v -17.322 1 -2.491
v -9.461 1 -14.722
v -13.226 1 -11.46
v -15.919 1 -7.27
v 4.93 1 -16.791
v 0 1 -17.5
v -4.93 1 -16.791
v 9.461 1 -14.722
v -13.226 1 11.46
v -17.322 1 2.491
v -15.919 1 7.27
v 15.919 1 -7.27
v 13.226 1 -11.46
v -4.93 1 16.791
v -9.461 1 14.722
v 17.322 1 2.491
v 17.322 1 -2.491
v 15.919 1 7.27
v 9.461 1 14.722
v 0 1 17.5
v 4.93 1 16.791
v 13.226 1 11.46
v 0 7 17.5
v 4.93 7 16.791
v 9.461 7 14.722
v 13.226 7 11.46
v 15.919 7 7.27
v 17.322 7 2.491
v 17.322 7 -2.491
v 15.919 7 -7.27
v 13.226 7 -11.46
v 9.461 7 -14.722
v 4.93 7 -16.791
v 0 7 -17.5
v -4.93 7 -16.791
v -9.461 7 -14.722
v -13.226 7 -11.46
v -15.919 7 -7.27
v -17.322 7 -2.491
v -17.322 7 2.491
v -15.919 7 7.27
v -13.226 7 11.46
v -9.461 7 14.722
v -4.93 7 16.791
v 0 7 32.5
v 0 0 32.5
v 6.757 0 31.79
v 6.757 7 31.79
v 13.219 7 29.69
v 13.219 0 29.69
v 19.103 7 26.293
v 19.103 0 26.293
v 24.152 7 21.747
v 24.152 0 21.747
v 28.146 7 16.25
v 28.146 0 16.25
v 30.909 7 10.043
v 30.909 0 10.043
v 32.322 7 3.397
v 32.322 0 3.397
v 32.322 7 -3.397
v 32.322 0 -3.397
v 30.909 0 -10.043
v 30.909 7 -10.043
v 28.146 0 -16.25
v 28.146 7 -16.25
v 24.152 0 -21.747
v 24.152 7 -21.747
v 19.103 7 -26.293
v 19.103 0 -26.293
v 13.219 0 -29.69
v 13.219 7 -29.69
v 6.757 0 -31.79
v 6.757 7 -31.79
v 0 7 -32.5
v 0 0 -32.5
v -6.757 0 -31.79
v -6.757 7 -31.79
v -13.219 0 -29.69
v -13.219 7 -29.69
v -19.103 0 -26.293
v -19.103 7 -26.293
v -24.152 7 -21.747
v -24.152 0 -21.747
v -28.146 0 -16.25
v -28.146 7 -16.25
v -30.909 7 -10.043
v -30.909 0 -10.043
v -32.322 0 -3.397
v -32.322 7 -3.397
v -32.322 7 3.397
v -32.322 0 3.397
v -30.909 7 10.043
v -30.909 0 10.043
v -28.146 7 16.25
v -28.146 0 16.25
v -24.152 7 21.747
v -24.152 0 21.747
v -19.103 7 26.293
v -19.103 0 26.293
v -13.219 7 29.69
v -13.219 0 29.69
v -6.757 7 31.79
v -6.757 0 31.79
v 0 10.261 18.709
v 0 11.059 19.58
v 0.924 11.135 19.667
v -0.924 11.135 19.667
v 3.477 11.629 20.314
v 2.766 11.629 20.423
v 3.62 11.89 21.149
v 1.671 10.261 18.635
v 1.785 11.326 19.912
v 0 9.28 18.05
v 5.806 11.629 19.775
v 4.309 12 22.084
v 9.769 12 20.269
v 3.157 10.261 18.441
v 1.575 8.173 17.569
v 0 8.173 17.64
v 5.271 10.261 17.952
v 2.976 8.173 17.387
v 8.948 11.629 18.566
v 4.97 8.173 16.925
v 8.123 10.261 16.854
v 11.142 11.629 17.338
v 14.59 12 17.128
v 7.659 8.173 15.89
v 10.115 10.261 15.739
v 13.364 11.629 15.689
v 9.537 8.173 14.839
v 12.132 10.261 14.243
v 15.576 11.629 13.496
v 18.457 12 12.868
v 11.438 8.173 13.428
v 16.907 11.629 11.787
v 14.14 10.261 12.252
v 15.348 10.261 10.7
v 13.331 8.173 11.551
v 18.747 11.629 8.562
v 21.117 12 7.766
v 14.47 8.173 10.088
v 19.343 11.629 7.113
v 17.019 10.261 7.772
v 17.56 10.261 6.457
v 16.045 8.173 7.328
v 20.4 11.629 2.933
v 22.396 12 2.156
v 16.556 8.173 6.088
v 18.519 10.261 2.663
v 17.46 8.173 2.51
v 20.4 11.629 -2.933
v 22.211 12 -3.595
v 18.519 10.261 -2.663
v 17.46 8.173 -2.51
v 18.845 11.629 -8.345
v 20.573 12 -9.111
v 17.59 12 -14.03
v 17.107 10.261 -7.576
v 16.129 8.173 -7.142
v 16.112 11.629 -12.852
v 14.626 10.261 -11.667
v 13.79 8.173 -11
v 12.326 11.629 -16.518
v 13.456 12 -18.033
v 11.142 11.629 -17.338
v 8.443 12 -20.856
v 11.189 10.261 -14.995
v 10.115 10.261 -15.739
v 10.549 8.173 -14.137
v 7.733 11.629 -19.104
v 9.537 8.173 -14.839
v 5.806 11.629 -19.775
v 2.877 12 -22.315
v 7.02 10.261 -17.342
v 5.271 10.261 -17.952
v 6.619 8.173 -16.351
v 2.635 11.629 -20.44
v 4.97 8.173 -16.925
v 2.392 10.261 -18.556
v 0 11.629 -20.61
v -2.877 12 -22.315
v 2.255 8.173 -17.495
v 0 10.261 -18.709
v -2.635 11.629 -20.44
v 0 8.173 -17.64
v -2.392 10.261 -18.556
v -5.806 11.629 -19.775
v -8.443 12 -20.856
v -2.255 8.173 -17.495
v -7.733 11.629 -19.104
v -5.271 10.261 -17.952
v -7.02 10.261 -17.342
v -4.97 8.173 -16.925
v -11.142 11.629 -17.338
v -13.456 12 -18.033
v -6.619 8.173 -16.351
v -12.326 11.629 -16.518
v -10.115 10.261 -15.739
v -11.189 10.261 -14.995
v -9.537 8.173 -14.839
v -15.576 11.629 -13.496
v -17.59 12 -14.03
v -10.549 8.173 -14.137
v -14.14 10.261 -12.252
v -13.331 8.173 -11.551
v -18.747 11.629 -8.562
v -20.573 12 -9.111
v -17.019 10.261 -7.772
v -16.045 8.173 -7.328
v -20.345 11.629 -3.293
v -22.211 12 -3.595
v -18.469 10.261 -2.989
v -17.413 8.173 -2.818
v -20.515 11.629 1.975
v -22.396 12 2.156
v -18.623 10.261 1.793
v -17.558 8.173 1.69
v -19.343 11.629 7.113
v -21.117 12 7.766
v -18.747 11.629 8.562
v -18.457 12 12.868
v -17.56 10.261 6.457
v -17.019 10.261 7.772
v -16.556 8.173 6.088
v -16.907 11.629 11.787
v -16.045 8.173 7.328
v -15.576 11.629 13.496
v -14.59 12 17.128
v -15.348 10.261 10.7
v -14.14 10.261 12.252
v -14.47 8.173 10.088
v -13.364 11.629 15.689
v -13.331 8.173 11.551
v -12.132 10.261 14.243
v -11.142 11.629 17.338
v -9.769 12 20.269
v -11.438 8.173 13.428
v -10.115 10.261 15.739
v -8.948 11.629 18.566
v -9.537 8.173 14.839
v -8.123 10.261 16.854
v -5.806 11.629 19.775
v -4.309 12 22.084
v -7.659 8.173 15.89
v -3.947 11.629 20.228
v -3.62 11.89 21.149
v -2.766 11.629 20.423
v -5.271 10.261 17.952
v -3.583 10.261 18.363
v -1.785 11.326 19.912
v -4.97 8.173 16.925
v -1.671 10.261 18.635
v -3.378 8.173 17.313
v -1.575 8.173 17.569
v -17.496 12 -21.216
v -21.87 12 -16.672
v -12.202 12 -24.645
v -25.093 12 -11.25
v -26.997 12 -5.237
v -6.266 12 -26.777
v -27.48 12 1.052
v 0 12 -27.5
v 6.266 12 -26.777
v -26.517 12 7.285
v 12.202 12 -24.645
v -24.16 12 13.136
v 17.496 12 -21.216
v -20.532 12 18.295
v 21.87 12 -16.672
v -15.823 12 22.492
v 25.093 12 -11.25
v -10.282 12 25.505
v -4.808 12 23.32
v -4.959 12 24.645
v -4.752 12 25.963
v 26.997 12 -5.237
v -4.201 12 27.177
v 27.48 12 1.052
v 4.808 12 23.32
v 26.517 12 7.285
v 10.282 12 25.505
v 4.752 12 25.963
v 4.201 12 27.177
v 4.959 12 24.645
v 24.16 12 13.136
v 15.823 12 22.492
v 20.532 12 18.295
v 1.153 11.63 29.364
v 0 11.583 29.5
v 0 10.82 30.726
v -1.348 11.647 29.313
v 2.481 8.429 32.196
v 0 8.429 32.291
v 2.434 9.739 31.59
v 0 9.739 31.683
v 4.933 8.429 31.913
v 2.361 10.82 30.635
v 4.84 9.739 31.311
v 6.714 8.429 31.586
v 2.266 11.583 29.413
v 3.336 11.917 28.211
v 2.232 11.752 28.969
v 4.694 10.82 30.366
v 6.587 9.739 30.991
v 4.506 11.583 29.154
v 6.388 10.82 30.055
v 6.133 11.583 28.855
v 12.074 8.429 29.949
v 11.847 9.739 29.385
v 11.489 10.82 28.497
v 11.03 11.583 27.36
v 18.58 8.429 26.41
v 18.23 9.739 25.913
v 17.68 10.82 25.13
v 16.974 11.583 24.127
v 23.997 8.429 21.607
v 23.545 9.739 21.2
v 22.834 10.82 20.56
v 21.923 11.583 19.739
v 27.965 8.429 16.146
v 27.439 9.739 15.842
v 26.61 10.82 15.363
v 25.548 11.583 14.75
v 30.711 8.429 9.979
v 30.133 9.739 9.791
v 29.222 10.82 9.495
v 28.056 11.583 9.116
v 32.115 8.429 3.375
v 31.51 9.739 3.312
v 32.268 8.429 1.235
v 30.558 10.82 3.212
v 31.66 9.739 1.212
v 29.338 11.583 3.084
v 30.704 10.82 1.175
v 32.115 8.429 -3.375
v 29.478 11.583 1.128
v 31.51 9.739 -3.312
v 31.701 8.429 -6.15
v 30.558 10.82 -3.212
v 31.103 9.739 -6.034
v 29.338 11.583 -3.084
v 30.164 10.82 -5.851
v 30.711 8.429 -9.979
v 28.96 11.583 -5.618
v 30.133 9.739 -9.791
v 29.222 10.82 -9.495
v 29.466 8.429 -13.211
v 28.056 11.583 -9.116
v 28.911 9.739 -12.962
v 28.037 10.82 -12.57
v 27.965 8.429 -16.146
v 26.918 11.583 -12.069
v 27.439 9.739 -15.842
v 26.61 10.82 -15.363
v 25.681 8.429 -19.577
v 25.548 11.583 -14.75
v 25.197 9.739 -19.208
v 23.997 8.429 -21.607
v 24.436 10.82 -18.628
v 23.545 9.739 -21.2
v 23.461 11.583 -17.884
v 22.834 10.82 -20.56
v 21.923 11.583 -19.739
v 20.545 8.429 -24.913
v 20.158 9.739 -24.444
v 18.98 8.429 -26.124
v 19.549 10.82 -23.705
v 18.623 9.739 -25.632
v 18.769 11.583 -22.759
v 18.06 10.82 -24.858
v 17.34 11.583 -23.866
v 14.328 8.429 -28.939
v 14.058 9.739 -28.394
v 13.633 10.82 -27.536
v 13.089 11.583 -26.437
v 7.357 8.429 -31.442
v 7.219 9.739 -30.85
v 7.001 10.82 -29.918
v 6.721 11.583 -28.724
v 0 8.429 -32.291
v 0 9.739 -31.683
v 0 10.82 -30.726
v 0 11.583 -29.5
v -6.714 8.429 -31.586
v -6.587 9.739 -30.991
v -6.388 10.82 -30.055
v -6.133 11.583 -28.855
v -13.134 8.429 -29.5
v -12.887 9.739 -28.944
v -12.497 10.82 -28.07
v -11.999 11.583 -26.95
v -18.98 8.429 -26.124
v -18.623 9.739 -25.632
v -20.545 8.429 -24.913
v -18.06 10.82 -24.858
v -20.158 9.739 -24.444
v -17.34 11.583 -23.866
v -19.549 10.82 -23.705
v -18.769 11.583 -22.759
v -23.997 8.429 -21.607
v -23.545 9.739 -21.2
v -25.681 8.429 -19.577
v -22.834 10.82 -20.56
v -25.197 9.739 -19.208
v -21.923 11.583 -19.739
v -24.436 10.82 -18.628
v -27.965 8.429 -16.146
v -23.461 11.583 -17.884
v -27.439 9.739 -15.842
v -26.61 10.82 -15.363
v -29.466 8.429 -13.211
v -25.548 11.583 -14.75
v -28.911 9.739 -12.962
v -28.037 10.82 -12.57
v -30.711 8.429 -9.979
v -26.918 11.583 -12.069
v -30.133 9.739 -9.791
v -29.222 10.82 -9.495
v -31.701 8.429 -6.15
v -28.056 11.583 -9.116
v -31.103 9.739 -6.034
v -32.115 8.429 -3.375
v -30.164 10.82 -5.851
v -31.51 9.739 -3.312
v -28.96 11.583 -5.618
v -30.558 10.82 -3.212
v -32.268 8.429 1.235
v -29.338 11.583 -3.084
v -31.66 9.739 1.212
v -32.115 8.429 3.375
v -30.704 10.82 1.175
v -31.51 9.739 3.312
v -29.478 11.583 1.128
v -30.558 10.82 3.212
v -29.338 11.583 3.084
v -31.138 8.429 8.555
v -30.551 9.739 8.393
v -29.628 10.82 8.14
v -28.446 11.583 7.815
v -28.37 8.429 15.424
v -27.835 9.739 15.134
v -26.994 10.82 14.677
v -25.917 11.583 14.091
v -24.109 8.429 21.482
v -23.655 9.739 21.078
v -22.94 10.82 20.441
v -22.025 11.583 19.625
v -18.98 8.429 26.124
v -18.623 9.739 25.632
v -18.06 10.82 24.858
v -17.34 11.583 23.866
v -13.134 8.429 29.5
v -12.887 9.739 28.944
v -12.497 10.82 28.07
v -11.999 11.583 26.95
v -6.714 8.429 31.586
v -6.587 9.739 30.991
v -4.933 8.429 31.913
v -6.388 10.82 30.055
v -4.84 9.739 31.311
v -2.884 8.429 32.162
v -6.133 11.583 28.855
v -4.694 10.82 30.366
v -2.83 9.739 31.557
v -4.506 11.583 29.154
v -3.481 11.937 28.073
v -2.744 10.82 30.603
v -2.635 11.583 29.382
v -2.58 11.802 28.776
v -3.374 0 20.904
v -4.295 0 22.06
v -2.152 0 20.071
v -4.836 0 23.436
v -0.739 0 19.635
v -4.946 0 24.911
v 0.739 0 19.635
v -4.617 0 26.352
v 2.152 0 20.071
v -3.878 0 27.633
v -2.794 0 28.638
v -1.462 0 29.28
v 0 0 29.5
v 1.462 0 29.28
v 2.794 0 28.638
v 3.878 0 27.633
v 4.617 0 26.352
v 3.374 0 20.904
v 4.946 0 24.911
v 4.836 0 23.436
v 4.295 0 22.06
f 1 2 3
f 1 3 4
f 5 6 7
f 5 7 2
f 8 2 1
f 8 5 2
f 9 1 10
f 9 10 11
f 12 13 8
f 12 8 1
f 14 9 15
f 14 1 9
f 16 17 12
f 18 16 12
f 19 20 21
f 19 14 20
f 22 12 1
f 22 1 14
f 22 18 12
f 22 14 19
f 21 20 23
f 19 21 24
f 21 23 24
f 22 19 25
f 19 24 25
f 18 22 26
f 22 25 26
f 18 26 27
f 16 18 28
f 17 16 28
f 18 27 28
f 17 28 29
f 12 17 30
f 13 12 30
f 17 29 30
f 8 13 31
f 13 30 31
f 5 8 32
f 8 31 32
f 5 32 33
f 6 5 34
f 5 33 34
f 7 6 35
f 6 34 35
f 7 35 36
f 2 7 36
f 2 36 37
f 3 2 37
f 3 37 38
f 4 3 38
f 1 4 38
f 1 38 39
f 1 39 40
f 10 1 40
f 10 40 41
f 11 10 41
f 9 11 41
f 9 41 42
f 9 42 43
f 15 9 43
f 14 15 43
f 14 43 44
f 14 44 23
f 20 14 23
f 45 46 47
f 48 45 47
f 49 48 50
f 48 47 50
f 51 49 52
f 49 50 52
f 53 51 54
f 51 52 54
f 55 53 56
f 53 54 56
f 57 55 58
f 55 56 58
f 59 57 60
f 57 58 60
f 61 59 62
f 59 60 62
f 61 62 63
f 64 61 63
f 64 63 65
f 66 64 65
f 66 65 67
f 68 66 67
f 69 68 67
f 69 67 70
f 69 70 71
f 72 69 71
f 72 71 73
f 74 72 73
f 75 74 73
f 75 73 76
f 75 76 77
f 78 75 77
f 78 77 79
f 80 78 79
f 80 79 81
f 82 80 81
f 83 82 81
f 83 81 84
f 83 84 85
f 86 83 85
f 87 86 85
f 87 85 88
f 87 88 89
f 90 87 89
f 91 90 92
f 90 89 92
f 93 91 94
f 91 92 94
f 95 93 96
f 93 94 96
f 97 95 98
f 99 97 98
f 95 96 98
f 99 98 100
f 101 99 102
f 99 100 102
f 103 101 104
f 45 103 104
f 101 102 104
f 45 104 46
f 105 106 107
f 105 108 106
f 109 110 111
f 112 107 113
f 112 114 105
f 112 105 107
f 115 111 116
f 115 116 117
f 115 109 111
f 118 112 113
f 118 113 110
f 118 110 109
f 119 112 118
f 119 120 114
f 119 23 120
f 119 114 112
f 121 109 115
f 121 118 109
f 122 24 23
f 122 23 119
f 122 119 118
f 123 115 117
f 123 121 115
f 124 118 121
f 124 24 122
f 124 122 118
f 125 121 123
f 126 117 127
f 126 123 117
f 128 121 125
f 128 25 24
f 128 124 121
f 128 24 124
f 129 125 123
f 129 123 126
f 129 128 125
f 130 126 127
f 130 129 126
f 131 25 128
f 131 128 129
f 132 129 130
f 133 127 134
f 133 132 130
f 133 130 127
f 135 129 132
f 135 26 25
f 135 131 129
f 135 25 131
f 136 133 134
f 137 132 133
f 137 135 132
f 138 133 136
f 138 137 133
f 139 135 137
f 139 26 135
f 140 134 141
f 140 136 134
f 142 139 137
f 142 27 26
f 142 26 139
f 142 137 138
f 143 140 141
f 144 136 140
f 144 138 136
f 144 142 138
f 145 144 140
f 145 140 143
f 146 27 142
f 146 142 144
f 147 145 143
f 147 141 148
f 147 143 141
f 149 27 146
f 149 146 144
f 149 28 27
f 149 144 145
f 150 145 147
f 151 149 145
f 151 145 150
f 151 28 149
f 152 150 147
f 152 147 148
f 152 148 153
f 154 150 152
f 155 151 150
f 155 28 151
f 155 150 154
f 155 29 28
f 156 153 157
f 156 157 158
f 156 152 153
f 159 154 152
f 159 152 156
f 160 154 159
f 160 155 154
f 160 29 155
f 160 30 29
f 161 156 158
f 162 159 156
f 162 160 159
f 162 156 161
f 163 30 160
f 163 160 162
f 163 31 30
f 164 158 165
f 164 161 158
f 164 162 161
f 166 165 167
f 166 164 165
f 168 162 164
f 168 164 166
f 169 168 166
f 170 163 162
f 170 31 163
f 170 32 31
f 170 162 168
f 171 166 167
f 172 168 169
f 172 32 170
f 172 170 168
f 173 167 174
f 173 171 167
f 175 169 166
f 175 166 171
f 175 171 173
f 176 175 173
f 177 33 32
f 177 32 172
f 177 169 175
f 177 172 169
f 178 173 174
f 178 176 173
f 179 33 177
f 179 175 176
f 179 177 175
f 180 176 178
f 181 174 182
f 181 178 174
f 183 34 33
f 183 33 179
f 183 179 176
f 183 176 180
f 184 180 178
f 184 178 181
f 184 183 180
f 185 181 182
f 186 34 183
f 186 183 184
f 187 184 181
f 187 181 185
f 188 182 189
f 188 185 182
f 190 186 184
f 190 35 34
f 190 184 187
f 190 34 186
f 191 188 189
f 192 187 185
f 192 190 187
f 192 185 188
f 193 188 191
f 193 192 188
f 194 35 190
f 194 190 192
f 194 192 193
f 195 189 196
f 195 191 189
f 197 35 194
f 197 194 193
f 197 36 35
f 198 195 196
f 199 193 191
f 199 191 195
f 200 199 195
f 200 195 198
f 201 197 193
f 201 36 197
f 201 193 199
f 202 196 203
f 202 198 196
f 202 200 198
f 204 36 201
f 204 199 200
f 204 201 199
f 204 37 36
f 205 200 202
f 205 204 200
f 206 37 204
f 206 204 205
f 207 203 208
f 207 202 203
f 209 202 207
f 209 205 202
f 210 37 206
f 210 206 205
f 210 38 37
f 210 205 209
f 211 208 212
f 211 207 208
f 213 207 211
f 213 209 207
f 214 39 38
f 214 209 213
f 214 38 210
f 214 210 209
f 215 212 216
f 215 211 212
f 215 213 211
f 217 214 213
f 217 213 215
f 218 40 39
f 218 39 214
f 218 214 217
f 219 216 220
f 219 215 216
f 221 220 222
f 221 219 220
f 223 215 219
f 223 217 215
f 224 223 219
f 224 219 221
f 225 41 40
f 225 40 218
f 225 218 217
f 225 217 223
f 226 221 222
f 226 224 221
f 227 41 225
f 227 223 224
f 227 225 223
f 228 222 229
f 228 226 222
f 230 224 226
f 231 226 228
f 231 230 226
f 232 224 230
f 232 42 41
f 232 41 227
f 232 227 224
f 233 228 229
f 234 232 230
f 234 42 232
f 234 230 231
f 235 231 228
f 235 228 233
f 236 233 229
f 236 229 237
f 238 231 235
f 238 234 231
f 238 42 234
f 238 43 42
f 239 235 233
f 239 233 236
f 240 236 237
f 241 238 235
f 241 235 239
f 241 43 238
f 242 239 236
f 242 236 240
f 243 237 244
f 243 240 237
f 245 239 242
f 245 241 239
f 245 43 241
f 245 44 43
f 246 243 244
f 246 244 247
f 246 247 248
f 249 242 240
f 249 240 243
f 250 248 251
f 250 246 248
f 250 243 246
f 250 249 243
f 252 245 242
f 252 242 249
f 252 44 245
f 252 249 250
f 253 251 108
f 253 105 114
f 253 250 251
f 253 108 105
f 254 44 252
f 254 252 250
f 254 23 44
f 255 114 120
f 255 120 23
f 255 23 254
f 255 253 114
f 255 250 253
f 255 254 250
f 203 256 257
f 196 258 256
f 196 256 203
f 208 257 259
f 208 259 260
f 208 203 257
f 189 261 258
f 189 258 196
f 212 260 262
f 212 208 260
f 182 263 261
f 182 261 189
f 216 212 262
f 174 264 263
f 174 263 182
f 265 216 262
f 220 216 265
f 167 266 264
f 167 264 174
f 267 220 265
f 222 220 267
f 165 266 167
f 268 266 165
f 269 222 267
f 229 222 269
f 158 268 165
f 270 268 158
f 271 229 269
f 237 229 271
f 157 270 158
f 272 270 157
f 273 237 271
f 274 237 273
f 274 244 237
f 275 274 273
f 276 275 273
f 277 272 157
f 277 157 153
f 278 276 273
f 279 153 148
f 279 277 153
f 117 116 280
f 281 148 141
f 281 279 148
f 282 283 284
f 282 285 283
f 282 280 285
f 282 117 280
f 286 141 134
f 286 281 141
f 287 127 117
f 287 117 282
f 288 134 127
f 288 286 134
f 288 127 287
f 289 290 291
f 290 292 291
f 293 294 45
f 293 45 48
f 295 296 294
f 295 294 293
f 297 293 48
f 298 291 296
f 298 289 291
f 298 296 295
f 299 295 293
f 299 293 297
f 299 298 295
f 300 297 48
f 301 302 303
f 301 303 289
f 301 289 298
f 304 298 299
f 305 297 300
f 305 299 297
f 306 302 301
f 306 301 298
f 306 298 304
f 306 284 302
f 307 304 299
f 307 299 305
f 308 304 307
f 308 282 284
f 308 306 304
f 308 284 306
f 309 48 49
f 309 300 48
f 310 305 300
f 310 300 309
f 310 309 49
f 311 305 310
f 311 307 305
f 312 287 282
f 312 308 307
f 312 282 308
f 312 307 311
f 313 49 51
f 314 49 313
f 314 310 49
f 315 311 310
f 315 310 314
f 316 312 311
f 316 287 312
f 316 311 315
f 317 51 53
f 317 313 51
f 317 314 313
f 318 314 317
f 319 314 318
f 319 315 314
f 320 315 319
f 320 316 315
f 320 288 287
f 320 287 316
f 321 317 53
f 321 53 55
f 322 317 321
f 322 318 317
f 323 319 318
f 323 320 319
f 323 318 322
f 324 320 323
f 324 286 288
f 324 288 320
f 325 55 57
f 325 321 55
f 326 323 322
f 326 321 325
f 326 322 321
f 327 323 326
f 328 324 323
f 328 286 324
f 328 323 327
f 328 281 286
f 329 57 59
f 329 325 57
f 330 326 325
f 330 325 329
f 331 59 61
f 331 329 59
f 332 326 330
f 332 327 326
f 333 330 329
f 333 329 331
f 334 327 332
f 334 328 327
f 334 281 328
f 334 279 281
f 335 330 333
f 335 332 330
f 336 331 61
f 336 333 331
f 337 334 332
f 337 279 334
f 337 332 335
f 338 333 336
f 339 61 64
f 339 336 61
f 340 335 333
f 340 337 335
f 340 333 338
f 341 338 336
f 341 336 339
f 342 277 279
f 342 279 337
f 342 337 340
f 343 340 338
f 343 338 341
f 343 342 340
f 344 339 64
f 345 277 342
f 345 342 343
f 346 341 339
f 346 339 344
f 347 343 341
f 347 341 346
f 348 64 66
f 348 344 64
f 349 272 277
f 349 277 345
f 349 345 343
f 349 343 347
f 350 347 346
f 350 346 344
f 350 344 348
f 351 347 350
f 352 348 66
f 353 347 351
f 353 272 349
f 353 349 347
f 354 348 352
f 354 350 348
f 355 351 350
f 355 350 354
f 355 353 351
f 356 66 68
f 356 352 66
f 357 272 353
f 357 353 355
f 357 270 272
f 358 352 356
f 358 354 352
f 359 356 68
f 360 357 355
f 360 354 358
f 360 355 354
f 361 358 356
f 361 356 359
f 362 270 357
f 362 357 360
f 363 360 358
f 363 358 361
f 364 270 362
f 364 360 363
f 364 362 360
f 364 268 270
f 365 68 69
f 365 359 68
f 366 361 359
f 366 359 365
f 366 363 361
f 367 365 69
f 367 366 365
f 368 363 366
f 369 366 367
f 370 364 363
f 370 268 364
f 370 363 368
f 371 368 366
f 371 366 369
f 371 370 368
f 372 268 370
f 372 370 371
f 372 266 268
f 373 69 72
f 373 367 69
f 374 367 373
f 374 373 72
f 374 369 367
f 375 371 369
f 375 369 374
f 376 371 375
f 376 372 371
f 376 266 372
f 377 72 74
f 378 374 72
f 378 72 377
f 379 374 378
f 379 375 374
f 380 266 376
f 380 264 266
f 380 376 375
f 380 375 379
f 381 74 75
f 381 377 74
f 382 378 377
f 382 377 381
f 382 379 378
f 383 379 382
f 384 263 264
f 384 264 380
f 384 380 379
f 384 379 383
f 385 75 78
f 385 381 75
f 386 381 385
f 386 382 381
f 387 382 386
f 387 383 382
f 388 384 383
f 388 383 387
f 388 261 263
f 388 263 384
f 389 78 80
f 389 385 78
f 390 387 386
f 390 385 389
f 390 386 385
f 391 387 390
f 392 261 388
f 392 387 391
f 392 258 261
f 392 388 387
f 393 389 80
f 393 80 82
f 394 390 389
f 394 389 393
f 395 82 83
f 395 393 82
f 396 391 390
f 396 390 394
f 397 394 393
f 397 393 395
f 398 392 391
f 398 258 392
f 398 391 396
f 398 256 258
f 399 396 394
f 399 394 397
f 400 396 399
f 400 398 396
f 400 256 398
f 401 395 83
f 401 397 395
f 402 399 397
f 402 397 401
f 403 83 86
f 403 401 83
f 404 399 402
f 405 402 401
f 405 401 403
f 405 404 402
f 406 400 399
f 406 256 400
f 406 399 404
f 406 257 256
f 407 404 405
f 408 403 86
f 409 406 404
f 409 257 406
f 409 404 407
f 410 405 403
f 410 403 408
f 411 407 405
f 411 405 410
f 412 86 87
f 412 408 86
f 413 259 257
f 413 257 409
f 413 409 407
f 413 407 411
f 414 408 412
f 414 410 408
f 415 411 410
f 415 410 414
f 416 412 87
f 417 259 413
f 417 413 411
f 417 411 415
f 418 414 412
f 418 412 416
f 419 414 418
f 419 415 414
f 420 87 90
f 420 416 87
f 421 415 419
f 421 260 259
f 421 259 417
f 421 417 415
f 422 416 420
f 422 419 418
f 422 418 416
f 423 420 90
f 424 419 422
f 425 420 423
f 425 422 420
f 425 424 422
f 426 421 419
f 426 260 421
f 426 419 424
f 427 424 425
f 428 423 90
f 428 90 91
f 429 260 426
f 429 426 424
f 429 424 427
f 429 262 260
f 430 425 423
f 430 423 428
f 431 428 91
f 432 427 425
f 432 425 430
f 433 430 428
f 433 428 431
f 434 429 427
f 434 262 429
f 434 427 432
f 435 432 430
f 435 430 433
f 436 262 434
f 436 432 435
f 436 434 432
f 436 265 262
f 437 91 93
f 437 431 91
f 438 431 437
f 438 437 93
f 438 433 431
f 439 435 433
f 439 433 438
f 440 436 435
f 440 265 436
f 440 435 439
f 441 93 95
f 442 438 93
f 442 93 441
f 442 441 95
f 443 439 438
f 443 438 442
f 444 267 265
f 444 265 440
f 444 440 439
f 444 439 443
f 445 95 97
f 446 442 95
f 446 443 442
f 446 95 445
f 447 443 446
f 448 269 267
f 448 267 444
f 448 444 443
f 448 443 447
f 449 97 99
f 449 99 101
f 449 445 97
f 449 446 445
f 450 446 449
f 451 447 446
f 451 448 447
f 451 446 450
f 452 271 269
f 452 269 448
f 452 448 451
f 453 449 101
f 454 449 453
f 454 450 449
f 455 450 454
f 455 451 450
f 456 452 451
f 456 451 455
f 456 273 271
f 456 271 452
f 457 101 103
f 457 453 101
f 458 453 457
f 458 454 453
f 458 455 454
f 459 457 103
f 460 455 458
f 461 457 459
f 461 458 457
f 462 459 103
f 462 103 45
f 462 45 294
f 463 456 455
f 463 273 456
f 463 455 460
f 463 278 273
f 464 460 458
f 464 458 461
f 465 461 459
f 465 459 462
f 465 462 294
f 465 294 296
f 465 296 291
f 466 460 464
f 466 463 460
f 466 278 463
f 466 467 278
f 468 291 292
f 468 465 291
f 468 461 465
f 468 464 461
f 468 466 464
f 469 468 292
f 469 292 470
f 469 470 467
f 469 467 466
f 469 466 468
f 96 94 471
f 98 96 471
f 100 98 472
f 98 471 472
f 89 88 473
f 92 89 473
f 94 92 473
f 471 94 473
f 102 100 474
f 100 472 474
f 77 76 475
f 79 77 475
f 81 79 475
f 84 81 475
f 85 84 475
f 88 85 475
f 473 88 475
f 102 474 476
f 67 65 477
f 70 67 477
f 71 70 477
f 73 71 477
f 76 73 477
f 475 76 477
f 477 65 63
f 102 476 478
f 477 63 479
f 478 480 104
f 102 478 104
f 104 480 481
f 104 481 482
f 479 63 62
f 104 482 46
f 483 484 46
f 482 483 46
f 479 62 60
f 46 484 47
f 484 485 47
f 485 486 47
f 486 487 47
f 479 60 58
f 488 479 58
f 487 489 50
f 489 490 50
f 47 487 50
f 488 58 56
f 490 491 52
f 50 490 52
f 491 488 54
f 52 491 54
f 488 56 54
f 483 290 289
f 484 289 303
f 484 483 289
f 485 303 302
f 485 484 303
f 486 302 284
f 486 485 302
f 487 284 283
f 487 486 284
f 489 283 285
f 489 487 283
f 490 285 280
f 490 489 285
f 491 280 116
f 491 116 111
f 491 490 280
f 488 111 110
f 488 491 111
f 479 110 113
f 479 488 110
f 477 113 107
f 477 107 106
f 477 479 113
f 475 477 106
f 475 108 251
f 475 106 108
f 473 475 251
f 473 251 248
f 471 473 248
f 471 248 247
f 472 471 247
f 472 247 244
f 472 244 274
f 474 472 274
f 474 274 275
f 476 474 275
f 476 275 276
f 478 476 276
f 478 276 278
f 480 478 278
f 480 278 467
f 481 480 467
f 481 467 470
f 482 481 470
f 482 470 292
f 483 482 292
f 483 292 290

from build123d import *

# Parameters (mm, degrees)
CROQUIS1_R              = 32.5
CROQUIS1_R_2            = 4.96
SALIENTE_EXTRUIR1_DEPTH = 12
CROQUIS2_R              = 17.5
CORTAR_EXTRUIR1_DEPTH   = 11
REDONDEO4_R             = 5
REDONDEO5_R             = 5


with BuildPart() as part:
    # Croquis1 → Saliente-Extruir1 (new body)
    with BuildSketch(Plane(origin=(0, 0, 0), x_dir=(1, 0, 0), z_dir=(0, 1, 0))):
        with Locations(Location((0, 0, 0), (0, 0, 270))):
            Circle(CROQUIS1_R)
        with Locations(Location((0, -24.54, 0), (0, 0, 270))):
            Circle(CROQUIS1_R_2, mode=Mode.SUBTRACT)
    extrude(amount=SALIENTE_EXTRUIR1_DEPTH)

    # Croquis2 → Cortar-Extruir1 (cut)
    with BuildSketch(Plane(origin=(0, 12, 0), x_dir=(1, 0, 0), z_dir=(0, 1, 0))):
        with Locations(Location((0, 0, 0), (0, 0, 270))):
            Circle(CROQUIS2_R)
    extrude(amount=-CORTAR_EXTRUIR1_DEPTH, mode=Mode.SUBTRACT)

    # Redondeo4
    # the kernel refuses this fillet: 5 mm, written as the material it takes off along each edge
    with BuildSketch(Plane(origin=(0, 12, 0), x_dir=(0, 0, 1), z_dir=(-1, 0, 0))) as redondeo4_piece_1:
        with BuildLine():
            CenterArc((32.5 - REDONDEO4_R, -REDONDEO4_R), REDONDEO4_R, 0, 90)
            Line((32.5 - REDONDEO4_R, 0), (32.5, 0))
            Line((32.5, 0), (32.5, -REDONDEO4_R))
        make_face()
    revolve(axis=Axis((0, 12, 0), (0, 1, 0)), mode=Mode.SUBTRACT)

    # Redondeo5
    # the kernel refuses this fillet: 5 mm, written as the material it takes off along each edge
    with BuildSketch(Plane(origin=(0, 12, 0), x_dir=(0, 0, 1), z_dir=(-1, 0, 0))) as redondeo5_piece_1:
        with BuildLine():
            CenterArc((17.5 + REDONDEO5_R, -REDONDEO5_R), REDONDEO5_R, 90, 90)
            Line((17.5, -REDONDEO5_R), (17.5, 0))
            Line((17.5, 0), (17.5 + REDONDEO5_R, 0))
        make_face()
    revolve(axis=Axis((0, 12, 0), (0, 1, 0)), mode=Mode.SUBTRACT)


solid = part.part
